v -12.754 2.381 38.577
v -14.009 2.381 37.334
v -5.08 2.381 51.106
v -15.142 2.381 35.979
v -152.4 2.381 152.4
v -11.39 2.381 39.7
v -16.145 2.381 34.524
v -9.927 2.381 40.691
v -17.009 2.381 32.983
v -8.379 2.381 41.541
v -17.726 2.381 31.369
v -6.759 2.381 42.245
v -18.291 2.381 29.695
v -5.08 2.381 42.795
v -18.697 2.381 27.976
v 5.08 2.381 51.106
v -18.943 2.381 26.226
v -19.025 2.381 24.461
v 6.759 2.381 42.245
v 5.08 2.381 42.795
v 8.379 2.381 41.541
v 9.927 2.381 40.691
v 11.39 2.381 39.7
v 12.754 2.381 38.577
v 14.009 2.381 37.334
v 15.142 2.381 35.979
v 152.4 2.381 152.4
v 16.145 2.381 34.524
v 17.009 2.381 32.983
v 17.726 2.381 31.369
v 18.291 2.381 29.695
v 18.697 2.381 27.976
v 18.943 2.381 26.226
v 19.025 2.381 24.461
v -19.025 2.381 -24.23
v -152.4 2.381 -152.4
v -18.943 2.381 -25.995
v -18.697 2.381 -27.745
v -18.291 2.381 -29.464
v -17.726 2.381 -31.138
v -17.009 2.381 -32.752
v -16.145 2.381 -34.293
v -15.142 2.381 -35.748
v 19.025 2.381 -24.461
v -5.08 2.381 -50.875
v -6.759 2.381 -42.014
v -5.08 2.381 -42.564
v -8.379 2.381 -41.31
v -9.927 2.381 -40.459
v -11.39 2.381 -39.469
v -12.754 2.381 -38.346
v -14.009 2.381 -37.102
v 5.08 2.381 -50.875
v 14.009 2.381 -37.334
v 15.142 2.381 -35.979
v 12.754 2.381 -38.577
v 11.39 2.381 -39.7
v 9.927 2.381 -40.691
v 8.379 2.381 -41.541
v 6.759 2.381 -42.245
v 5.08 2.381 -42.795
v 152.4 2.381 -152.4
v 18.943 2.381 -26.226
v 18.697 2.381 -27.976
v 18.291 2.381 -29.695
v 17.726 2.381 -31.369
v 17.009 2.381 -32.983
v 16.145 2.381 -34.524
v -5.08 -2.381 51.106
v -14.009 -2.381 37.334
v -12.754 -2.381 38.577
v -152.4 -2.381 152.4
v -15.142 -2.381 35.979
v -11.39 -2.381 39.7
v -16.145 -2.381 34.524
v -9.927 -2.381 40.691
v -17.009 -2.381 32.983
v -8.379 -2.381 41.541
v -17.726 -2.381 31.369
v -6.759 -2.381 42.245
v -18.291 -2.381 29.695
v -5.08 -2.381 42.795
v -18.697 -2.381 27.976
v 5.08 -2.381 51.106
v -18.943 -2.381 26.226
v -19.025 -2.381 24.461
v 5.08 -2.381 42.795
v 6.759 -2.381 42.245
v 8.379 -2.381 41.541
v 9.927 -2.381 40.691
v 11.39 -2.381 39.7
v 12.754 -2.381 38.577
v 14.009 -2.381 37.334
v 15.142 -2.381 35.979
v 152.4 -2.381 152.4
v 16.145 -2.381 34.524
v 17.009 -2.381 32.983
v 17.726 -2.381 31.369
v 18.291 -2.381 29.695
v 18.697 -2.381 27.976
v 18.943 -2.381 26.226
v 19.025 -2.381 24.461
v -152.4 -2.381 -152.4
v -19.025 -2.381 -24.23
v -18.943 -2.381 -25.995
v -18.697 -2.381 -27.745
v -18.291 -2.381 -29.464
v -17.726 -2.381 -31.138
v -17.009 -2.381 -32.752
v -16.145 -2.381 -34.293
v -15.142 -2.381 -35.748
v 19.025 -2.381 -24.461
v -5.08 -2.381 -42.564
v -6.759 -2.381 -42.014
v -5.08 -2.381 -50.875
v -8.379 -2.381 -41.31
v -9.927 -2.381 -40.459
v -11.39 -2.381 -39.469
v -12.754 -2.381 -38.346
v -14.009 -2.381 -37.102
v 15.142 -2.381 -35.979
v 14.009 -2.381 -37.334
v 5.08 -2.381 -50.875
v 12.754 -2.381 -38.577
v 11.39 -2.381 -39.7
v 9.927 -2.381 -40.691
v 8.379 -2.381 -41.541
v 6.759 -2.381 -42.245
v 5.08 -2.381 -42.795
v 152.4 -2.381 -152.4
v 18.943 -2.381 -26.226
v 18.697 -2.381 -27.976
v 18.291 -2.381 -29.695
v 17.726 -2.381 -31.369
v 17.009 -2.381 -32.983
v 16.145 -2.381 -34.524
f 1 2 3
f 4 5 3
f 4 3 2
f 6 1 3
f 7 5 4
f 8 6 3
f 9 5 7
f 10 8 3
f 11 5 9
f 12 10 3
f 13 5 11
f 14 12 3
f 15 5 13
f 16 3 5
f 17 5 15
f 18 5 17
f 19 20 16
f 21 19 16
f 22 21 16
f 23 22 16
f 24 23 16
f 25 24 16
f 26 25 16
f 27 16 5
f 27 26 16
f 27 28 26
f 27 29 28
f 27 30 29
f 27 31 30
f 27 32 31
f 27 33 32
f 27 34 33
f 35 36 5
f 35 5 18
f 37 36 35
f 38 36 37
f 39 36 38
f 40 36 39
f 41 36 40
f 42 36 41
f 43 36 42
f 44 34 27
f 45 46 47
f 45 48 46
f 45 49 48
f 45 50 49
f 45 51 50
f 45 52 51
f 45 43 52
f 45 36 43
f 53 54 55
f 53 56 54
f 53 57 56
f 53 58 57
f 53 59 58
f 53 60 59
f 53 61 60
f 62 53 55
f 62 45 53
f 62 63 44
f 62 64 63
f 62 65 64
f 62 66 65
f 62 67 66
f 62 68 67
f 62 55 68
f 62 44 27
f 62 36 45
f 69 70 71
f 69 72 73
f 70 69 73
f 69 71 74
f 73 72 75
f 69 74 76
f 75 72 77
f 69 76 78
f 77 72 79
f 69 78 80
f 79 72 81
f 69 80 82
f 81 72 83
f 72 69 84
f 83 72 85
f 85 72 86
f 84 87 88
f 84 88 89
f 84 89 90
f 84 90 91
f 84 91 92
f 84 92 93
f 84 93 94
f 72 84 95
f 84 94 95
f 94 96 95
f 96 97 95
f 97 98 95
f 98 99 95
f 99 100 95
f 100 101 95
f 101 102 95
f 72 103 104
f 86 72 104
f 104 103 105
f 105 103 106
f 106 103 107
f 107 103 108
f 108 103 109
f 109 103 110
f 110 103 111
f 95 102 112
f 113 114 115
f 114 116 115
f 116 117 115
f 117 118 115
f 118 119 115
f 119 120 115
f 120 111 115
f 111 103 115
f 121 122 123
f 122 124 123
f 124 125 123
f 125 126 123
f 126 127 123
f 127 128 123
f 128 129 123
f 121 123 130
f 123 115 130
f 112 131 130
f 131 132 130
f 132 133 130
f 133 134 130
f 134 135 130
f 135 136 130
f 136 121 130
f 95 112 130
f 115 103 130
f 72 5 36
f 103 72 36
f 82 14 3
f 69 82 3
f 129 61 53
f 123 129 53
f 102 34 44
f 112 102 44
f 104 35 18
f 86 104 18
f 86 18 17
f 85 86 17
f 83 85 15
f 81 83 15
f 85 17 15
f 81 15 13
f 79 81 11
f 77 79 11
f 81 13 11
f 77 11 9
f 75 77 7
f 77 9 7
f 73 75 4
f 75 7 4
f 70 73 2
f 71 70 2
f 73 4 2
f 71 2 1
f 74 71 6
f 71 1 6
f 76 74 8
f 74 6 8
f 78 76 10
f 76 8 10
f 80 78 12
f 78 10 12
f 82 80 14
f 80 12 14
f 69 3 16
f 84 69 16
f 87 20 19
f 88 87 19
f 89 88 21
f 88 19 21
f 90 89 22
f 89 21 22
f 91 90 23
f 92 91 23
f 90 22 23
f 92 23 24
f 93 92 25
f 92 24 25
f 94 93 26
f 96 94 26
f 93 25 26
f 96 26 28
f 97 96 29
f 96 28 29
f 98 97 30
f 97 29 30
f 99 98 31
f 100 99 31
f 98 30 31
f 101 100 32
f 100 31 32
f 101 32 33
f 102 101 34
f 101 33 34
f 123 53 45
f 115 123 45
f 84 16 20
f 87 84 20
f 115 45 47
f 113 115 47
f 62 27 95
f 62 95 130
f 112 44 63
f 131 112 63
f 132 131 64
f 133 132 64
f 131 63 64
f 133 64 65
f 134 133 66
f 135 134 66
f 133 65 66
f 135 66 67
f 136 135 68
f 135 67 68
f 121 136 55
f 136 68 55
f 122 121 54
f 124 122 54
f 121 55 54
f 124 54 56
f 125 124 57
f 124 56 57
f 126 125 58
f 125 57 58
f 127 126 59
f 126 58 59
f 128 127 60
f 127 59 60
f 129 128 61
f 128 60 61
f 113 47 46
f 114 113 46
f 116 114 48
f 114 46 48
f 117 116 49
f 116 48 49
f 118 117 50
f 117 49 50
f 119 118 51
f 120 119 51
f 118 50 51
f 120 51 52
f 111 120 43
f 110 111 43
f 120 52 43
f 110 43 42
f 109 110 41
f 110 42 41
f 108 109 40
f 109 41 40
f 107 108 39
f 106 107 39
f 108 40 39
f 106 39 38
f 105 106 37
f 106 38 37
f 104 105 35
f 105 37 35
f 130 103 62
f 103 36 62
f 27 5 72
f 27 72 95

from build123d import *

# Parameters (mm, degrees)
ESQUISSE1_W             = 304.8
ESQUISSE1_H             = 304.8
BOSS_EXTRU_1_DEPTH      = 2.38125
ENL_V_MAT_EXTRU_1_DEPTH = 216.578759172


with BuildPart() as part:
    # Esquisse1 → Boss.-Extru.1 (new, symmetric)
    with BuildSketch(Plane(origin=(0, 0, 0), x_dir=(1, 0, 0), z_dir=(0, 1, 0))):
        Rectangle(ESQUISSE1_W, ESQUISSE1_H)
    extrude(amount=BOSS_EXTRU_1_DEPTH, both=True)

    # Esquisse2 → Enlèv. mat.-Extru.1 (cut, through all)
    with BuildSketch(Plane(origin=(0, 2.38125, 0), x_dir=(1, 0, 0), z_dir=(0, 1, 0))):
        with BuildLine():
            Line((-5.08, -51.10603291), (5.08, -51.10603291))
            Line((5.08, -51.10603291), (5.08, -42.795254256))
            ThreePointArc((5.08, -42.795254256), (15.142330949, -35.978603508), (19.0246, -24.46143291))
            Line((19.0246, -24.46143291), (19.0246, 24.46143291))
            ThreePointArc((19.0246, 24.46143291), (15.142330949, 35.978603508), (5.08, 42.795254256))
            Line((5.08, 42.795254256), (5.08, 50.87496709))
            Line((5.08, 50.87496709), (-5.08, 50.87496709))
            Line((-5.08, 50.87496709), (-5.08, 42.564188437))
            ThreePointArc((-5.08, 42.564188437), (-15.142330949, 35.747537688), (-19.0246, 24.23036709))
            Line((-19.0246, 24.23036709), (-19.0246, -24.46143291))
            ThreePointArc((-19.0246, -24.46143291), (-15.142330949, -35.978603508), (-5.08, -42.795254256))
            Line((-5.08, -42.795254256), (-5.08, -51.10603291))
        make_face()
    extrude(amount=-ENL_V_MAT_EXTRU_1_DEPTH, mode=Mode.SUBTRACT)


solid = part.part
